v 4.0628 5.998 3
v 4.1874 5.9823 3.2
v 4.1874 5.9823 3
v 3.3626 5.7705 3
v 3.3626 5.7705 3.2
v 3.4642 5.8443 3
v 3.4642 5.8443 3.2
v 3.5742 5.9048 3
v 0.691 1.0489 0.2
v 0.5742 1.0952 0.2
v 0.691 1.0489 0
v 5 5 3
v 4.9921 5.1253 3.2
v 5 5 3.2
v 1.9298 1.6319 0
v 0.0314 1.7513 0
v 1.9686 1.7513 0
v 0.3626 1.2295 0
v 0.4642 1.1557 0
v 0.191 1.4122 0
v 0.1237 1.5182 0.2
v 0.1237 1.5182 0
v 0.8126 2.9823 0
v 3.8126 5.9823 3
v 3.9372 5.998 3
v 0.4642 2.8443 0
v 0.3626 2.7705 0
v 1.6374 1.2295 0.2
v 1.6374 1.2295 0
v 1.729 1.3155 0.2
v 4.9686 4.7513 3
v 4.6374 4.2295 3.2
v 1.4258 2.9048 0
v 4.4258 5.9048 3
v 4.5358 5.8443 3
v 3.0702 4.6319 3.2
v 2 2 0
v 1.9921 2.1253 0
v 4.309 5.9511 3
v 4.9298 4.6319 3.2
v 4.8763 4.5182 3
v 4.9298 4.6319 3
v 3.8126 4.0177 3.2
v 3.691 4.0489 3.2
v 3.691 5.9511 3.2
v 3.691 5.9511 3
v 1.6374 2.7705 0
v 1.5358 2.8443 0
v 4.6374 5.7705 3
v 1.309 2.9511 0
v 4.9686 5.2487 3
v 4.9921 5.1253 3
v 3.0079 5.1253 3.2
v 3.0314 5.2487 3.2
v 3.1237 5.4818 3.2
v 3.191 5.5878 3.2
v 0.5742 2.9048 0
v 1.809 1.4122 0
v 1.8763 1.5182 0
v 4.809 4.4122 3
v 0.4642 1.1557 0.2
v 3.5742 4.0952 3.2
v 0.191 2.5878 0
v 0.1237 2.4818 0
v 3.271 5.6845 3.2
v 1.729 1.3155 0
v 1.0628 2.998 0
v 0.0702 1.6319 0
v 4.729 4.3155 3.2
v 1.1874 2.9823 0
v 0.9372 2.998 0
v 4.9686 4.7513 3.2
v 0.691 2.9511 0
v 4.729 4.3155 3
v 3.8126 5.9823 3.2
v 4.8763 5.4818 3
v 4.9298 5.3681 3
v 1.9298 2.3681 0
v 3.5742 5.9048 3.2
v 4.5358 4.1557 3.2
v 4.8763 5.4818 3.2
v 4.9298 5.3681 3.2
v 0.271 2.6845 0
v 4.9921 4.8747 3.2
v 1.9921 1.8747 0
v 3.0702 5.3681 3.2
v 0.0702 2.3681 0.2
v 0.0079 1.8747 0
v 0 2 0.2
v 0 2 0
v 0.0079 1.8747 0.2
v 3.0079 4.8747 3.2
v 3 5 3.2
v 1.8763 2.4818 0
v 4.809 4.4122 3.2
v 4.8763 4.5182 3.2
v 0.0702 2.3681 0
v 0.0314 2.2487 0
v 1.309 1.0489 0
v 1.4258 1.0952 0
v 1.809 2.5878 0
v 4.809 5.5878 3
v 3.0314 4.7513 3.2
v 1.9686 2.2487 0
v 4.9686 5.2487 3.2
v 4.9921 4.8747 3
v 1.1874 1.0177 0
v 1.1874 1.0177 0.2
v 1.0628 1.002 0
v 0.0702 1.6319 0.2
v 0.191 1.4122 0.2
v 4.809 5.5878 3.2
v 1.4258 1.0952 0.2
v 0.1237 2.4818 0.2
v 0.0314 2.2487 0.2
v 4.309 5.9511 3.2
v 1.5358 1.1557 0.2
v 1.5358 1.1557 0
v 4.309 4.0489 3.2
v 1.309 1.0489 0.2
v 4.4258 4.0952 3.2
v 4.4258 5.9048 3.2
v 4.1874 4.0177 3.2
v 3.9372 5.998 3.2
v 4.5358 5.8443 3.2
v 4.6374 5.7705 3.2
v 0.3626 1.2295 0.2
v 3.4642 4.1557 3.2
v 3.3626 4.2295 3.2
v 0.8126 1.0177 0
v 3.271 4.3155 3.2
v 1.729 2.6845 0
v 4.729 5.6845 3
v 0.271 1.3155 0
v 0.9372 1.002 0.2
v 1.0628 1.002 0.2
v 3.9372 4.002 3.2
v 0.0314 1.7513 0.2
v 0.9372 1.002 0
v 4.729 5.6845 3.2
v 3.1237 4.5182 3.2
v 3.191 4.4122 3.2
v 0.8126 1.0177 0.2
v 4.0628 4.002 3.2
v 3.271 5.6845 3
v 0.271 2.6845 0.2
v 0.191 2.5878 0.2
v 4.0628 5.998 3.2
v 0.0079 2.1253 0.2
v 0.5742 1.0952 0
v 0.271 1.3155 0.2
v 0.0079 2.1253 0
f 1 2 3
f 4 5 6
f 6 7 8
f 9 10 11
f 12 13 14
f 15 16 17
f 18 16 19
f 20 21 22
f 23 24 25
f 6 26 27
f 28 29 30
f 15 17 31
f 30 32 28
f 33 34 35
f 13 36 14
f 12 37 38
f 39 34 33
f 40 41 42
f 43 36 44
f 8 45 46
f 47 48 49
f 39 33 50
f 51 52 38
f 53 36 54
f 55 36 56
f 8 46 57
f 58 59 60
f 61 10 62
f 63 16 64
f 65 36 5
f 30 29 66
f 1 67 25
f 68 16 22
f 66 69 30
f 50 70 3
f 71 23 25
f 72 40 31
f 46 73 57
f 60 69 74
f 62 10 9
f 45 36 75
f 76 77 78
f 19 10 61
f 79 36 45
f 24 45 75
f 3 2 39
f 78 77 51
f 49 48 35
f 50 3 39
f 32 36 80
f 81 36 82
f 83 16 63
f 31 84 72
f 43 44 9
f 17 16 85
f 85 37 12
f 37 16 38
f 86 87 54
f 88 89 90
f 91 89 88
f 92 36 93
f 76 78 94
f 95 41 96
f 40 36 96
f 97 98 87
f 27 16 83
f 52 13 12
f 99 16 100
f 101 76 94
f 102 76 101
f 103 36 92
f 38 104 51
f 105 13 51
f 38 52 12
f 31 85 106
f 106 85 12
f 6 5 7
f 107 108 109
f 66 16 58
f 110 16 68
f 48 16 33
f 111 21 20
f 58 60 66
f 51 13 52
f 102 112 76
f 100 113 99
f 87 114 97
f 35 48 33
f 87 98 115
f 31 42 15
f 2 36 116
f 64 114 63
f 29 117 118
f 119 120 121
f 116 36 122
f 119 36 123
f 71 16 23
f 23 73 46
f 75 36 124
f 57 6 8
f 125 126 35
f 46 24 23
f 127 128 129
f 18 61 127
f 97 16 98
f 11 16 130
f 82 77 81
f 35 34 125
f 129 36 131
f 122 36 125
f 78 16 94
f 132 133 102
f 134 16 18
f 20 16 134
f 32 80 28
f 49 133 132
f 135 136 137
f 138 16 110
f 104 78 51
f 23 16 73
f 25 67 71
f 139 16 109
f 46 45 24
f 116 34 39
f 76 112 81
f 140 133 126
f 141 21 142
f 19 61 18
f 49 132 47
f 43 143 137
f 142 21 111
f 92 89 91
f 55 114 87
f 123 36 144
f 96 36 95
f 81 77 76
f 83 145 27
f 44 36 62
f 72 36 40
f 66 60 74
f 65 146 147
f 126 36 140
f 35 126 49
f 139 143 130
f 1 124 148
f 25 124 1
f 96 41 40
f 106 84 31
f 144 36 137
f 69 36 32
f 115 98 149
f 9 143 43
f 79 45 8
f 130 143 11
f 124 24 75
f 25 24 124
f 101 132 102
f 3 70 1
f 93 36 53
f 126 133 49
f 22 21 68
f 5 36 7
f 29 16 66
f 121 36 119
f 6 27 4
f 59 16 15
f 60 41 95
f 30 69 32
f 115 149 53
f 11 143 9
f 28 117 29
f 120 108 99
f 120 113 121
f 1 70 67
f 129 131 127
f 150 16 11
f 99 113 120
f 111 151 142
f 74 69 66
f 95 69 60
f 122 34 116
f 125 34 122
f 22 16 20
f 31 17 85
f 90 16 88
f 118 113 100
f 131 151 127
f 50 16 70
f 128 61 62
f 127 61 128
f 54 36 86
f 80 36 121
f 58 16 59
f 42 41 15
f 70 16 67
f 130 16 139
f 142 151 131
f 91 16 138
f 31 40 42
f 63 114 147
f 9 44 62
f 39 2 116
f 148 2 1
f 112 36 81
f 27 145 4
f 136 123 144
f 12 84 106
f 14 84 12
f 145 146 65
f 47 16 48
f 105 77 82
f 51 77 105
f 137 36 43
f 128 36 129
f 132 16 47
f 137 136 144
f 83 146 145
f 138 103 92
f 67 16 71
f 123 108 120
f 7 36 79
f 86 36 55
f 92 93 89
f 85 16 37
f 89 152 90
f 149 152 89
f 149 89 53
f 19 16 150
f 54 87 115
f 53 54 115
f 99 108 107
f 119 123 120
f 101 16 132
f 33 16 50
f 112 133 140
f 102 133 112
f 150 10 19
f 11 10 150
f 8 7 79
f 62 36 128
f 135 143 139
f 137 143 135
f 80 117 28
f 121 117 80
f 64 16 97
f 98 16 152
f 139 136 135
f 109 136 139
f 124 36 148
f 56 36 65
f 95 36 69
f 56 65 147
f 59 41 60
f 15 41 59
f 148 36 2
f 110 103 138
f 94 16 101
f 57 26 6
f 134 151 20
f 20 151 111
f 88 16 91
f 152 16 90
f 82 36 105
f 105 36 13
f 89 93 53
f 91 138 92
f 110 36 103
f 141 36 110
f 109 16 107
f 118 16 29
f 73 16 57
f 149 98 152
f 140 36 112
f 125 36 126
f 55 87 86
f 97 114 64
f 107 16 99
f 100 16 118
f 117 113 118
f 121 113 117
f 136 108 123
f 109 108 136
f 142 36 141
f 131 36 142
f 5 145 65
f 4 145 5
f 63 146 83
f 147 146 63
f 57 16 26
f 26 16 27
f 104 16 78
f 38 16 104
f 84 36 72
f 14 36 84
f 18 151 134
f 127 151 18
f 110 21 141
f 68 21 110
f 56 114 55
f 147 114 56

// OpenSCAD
//slanted_pillar_test
//slanted pillar for thesis
//pillar from pt1 to pt2
//slanted_pillar(x1, y1, z1, x2, y2, z2)
//where z1 is above z2
$fa = 50;
$fn = 50;
radius = 1;

x_1 = 1;
y_1 = 2;
z_1 = 0;
x_2 = 4;
y_2 = 5;
z_2 = 3;

module circle1(x_coord, y_coord, z_coord)
{
    translate([x_coord, y_coord, z_coord])
    cylinder(.2, radius, radius);
}
//circle1(x_1, y_1, z_1);

module circle2(x_coord, y_coord, z_coord)
{
    translate([x_coord, y_coord, z_coord])
    cylinder(.2, radius, radius);
}
//circle2(x_2, y_2, z_2);

module slanted_pillar(x_coord1, y_coord1, z_coord1, x_coord2, y_coord2, z_coord2)
{
    hull()
    {
        circle1(x_coord1, y_coord1, z_coord1);
        circle2(x_coord2, y_coord2, z_coord2);
    }
}
slanted_pillar(x_1, y_1, z_1, x_2, y_2, z_2);
